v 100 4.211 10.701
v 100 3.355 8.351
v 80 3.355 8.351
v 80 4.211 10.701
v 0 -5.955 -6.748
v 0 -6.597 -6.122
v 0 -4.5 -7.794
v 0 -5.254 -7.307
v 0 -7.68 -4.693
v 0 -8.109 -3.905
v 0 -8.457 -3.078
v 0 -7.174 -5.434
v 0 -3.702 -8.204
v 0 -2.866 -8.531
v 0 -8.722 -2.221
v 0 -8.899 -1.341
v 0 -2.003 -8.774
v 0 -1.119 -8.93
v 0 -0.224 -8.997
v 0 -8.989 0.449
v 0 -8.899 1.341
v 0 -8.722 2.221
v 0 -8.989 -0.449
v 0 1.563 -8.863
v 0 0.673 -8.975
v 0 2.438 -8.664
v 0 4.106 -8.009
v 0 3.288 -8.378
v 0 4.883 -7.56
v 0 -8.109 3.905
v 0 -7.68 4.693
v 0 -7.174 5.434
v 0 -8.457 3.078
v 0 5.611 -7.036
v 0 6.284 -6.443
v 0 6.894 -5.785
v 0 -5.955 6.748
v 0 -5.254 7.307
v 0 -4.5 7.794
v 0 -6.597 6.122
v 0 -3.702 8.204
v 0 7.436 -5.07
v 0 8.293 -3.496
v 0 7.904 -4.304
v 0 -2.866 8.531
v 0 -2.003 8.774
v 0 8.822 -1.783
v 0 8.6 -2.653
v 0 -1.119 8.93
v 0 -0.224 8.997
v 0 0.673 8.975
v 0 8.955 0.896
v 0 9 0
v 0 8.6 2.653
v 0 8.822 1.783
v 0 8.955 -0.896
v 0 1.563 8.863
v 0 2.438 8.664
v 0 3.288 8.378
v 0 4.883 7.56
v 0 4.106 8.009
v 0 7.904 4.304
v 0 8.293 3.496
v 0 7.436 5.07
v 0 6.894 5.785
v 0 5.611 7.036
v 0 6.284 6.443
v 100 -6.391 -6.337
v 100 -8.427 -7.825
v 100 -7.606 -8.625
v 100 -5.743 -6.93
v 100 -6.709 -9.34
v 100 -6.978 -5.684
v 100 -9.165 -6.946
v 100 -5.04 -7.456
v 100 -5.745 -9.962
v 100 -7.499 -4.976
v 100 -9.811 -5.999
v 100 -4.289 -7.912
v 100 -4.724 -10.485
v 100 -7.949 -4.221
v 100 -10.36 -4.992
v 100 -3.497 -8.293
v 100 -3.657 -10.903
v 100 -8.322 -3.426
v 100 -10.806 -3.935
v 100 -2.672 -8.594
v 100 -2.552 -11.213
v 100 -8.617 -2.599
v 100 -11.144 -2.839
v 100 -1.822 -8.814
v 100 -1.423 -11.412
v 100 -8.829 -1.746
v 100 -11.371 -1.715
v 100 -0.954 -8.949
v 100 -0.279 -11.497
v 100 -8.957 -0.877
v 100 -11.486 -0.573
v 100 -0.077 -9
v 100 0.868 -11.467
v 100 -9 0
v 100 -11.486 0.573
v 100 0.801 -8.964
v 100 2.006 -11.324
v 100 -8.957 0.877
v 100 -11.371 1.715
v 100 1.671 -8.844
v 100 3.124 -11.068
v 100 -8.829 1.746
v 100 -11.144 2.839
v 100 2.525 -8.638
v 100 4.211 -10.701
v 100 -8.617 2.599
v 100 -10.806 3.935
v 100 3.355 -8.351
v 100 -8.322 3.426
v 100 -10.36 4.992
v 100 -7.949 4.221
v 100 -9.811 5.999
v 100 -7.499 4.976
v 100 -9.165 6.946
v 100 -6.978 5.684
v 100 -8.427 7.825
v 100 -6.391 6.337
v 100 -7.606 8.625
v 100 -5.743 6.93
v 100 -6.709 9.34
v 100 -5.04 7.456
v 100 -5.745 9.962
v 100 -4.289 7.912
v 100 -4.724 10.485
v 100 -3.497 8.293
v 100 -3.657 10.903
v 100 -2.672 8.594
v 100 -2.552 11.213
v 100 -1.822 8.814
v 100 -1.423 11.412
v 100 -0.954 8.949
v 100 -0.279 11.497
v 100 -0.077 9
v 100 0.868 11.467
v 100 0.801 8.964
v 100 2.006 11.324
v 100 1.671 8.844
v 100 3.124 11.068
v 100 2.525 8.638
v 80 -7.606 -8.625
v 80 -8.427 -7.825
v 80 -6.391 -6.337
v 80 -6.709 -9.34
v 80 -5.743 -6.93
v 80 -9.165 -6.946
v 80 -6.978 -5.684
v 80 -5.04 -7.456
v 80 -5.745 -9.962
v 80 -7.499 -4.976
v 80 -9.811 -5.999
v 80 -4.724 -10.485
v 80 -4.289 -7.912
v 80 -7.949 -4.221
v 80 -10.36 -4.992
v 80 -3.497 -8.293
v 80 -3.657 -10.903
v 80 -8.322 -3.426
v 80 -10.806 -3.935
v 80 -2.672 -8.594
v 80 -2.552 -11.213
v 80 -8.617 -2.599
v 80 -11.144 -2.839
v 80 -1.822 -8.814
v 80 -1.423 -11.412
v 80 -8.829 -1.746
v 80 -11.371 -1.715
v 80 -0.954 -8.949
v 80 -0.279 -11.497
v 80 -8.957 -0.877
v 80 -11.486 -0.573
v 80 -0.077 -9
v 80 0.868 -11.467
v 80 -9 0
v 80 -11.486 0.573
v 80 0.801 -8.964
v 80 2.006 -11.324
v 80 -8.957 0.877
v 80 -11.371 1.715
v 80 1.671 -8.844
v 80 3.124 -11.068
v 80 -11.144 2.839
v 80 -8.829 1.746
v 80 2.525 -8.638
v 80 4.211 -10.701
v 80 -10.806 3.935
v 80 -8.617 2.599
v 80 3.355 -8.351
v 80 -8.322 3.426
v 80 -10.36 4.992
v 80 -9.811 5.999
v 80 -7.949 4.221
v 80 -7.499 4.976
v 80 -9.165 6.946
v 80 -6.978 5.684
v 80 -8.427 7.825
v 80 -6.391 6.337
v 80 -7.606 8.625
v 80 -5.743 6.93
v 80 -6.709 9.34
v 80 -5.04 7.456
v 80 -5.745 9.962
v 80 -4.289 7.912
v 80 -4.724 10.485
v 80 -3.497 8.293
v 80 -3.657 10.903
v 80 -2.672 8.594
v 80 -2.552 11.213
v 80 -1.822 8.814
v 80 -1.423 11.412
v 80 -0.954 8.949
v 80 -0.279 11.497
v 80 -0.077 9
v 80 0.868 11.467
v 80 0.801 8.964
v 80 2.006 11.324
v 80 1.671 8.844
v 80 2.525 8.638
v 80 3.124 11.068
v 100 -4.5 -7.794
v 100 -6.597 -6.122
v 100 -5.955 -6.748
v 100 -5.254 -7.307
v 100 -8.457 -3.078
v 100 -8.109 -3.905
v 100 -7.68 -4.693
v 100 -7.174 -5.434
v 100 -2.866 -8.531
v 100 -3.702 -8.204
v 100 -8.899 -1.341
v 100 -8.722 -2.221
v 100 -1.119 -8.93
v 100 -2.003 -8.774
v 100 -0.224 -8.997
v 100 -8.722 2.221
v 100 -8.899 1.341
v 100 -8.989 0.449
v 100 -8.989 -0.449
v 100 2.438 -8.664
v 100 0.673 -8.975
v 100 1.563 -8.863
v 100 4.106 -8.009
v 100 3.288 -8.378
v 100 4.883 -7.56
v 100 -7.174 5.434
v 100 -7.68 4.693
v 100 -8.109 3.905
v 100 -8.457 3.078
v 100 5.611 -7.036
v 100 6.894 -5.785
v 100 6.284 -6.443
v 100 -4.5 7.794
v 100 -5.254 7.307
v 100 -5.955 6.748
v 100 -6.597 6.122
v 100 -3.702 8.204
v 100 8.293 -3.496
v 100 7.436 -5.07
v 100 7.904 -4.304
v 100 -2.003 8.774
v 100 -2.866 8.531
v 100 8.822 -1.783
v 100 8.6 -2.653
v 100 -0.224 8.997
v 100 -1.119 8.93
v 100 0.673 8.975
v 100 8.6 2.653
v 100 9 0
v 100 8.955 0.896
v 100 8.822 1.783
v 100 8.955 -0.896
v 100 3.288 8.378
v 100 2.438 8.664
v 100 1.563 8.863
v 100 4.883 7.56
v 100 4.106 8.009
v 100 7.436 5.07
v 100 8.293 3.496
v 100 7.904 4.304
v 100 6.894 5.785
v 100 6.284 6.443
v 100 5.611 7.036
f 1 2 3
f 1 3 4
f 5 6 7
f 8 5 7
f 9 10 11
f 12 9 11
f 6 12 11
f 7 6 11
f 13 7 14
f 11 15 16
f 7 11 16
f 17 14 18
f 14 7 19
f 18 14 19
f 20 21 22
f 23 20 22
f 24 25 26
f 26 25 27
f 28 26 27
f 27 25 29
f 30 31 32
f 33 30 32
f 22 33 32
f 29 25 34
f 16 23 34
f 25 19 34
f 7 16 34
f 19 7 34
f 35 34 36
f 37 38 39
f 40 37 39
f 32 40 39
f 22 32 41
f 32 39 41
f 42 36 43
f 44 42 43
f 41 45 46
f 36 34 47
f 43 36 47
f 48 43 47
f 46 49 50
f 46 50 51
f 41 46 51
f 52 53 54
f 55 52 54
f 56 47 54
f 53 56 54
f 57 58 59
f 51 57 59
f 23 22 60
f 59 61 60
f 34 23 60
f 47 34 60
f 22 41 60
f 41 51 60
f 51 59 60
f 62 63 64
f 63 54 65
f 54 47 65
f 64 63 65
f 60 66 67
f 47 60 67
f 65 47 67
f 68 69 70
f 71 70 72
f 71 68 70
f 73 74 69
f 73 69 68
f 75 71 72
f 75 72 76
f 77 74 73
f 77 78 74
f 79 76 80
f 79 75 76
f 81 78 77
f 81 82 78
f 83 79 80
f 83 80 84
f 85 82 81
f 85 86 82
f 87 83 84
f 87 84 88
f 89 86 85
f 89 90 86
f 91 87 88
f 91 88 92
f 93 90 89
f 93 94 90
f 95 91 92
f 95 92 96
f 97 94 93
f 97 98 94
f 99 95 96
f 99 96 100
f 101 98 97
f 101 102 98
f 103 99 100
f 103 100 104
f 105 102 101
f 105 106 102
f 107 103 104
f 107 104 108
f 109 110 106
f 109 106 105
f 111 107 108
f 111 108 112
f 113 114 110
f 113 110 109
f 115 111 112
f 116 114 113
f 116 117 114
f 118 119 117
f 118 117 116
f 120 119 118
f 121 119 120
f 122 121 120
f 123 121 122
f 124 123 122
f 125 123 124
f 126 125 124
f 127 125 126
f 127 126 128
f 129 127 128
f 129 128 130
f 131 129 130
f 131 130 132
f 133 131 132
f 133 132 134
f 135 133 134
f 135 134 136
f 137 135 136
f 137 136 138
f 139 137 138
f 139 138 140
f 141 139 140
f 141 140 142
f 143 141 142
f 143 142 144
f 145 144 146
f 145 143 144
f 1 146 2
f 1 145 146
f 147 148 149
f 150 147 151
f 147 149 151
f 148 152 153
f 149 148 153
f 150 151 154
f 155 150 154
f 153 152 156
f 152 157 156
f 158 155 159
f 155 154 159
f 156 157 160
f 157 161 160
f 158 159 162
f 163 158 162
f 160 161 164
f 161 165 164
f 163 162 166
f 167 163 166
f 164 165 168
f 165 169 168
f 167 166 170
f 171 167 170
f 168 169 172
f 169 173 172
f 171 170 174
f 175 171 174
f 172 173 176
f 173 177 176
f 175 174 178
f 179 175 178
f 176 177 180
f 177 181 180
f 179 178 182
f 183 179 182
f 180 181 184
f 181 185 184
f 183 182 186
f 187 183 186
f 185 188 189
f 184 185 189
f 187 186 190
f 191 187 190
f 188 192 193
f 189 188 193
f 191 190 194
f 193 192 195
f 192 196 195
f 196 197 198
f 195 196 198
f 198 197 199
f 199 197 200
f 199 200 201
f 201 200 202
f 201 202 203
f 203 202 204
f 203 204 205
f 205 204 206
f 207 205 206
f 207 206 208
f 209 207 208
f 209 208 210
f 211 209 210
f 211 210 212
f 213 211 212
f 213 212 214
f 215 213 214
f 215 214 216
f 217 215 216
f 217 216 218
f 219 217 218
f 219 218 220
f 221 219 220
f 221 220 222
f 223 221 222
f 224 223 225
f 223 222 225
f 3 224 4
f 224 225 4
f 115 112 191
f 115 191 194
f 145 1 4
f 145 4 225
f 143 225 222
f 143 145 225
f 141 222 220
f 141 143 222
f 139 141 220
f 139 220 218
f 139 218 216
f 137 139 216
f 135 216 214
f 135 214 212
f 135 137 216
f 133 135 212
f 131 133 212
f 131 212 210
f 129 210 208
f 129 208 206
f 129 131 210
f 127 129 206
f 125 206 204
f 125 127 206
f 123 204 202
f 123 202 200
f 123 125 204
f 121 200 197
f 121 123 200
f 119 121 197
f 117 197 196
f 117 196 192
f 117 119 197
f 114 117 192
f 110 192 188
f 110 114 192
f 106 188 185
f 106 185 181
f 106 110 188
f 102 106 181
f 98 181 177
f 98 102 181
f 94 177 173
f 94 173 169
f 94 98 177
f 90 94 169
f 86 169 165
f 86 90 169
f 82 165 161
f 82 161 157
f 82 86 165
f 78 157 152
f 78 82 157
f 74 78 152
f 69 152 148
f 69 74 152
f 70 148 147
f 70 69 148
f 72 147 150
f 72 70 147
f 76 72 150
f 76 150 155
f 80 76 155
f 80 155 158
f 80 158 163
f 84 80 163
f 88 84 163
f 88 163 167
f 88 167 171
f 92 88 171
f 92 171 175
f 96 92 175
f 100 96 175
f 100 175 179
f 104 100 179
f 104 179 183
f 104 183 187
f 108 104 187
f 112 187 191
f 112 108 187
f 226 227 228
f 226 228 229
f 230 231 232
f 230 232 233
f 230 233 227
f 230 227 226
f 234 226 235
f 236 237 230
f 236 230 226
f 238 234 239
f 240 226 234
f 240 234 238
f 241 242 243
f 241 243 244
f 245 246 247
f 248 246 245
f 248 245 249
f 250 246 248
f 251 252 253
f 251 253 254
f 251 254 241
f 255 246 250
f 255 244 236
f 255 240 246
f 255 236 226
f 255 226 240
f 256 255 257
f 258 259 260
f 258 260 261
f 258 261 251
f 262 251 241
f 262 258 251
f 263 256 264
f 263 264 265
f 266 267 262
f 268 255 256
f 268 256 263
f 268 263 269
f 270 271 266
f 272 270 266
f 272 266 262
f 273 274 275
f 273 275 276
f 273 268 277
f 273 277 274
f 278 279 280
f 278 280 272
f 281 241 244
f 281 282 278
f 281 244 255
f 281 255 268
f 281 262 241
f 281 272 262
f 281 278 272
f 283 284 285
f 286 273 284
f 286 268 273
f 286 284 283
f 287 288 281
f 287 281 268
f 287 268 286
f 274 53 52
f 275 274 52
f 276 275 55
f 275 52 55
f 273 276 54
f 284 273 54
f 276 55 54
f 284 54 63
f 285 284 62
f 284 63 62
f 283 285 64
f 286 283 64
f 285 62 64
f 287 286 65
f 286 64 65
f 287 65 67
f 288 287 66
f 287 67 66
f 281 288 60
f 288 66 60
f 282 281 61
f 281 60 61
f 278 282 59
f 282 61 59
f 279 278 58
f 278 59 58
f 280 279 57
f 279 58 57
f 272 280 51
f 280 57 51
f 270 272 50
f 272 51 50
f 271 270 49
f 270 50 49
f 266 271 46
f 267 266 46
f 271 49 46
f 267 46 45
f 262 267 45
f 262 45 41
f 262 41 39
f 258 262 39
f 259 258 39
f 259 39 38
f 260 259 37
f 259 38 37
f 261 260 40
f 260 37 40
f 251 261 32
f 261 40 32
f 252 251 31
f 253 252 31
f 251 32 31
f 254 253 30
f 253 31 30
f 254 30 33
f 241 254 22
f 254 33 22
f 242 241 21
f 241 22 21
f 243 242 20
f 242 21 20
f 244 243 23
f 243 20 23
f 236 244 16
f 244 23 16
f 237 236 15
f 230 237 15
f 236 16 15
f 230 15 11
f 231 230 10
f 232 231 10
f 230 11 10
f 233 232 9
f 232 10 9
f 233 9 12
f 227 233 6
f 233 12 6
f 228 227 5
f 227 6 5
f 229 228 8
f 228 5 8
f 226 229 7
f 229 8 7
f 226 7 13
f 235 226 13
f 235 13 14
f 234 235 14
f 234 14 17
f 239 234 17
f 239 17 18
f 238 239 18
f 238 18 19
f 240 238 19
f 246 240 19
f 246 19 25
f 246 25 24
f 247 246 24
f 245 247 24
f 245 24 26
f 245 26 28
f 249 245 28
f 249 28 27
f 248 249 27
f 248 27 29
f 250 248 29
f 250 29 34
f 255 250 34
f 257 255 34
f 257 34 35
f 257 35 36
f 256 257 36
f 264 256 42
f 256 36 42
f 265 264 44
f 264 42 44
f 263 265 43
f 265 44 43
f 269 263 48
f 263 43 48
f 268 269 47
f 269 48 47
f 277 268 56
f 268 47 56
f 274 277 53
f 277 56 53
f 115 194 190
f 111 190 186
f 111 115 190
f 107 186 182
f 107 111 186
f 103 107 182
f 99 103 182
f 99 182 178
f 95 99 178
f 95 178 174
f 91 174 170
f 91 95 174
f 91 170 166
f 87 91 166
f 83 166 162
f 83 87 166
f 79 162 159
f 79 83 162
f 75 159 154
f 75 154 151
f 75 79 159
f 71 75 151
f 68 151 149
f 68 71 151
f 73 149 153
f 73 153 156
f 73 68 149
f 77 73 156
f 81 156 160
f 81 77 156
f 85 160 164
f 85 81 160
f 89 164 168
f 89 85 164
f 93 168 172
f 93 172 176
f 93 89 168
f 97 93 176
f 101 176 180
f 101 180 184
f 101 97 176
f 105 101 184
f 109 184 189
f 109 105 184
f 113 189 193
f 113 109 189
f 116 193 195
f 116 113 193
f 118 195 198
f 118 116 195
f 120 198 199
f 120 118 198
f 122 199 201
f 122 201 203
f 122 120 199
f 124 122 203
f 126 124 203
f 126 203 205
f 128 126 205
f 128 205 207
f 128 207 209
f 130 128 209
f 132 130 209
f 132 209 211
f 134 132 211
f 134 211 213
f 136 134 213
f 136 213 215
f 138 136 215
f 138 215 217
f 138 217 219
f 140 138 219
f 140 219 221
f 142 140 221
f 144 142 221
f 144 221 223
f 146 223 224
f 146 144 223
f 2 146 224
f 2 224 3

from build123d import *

# Parameters (mm, degrees)
F0_R     = 9
F1_DEPTH = 100
F3_DEPTH = 20


with BuildPart() as f1:
    # F0 (on Right) → F1 (new body)
    with BuildSketch(Plane.YZ):
        Circle(F0_R)
    extrude(amount=F1_DEPTH)


with BuildPart() as f3:
    # F2 (on face) → F3 (new body)
    with BuildSketch(Plane.YZ.offset(100)):
        with BuildLine():
            ThreePointArc((3.355307, -8.351163), (-9, 0), (3.355307, 8.351163))
            Line((3.355307, 8.351163), (4.210721, 10.701394))
            ThreePointArc((4.210721, 10.701394), (-11.5, 0), (4.210721, -10.701394))
            Line((4.210721, -10.701394), (3.355307, -8.351163))
        make_face()
    extrude(amount=-F3_DEPTH)


solid = Compound([f1.part, f3.part])
